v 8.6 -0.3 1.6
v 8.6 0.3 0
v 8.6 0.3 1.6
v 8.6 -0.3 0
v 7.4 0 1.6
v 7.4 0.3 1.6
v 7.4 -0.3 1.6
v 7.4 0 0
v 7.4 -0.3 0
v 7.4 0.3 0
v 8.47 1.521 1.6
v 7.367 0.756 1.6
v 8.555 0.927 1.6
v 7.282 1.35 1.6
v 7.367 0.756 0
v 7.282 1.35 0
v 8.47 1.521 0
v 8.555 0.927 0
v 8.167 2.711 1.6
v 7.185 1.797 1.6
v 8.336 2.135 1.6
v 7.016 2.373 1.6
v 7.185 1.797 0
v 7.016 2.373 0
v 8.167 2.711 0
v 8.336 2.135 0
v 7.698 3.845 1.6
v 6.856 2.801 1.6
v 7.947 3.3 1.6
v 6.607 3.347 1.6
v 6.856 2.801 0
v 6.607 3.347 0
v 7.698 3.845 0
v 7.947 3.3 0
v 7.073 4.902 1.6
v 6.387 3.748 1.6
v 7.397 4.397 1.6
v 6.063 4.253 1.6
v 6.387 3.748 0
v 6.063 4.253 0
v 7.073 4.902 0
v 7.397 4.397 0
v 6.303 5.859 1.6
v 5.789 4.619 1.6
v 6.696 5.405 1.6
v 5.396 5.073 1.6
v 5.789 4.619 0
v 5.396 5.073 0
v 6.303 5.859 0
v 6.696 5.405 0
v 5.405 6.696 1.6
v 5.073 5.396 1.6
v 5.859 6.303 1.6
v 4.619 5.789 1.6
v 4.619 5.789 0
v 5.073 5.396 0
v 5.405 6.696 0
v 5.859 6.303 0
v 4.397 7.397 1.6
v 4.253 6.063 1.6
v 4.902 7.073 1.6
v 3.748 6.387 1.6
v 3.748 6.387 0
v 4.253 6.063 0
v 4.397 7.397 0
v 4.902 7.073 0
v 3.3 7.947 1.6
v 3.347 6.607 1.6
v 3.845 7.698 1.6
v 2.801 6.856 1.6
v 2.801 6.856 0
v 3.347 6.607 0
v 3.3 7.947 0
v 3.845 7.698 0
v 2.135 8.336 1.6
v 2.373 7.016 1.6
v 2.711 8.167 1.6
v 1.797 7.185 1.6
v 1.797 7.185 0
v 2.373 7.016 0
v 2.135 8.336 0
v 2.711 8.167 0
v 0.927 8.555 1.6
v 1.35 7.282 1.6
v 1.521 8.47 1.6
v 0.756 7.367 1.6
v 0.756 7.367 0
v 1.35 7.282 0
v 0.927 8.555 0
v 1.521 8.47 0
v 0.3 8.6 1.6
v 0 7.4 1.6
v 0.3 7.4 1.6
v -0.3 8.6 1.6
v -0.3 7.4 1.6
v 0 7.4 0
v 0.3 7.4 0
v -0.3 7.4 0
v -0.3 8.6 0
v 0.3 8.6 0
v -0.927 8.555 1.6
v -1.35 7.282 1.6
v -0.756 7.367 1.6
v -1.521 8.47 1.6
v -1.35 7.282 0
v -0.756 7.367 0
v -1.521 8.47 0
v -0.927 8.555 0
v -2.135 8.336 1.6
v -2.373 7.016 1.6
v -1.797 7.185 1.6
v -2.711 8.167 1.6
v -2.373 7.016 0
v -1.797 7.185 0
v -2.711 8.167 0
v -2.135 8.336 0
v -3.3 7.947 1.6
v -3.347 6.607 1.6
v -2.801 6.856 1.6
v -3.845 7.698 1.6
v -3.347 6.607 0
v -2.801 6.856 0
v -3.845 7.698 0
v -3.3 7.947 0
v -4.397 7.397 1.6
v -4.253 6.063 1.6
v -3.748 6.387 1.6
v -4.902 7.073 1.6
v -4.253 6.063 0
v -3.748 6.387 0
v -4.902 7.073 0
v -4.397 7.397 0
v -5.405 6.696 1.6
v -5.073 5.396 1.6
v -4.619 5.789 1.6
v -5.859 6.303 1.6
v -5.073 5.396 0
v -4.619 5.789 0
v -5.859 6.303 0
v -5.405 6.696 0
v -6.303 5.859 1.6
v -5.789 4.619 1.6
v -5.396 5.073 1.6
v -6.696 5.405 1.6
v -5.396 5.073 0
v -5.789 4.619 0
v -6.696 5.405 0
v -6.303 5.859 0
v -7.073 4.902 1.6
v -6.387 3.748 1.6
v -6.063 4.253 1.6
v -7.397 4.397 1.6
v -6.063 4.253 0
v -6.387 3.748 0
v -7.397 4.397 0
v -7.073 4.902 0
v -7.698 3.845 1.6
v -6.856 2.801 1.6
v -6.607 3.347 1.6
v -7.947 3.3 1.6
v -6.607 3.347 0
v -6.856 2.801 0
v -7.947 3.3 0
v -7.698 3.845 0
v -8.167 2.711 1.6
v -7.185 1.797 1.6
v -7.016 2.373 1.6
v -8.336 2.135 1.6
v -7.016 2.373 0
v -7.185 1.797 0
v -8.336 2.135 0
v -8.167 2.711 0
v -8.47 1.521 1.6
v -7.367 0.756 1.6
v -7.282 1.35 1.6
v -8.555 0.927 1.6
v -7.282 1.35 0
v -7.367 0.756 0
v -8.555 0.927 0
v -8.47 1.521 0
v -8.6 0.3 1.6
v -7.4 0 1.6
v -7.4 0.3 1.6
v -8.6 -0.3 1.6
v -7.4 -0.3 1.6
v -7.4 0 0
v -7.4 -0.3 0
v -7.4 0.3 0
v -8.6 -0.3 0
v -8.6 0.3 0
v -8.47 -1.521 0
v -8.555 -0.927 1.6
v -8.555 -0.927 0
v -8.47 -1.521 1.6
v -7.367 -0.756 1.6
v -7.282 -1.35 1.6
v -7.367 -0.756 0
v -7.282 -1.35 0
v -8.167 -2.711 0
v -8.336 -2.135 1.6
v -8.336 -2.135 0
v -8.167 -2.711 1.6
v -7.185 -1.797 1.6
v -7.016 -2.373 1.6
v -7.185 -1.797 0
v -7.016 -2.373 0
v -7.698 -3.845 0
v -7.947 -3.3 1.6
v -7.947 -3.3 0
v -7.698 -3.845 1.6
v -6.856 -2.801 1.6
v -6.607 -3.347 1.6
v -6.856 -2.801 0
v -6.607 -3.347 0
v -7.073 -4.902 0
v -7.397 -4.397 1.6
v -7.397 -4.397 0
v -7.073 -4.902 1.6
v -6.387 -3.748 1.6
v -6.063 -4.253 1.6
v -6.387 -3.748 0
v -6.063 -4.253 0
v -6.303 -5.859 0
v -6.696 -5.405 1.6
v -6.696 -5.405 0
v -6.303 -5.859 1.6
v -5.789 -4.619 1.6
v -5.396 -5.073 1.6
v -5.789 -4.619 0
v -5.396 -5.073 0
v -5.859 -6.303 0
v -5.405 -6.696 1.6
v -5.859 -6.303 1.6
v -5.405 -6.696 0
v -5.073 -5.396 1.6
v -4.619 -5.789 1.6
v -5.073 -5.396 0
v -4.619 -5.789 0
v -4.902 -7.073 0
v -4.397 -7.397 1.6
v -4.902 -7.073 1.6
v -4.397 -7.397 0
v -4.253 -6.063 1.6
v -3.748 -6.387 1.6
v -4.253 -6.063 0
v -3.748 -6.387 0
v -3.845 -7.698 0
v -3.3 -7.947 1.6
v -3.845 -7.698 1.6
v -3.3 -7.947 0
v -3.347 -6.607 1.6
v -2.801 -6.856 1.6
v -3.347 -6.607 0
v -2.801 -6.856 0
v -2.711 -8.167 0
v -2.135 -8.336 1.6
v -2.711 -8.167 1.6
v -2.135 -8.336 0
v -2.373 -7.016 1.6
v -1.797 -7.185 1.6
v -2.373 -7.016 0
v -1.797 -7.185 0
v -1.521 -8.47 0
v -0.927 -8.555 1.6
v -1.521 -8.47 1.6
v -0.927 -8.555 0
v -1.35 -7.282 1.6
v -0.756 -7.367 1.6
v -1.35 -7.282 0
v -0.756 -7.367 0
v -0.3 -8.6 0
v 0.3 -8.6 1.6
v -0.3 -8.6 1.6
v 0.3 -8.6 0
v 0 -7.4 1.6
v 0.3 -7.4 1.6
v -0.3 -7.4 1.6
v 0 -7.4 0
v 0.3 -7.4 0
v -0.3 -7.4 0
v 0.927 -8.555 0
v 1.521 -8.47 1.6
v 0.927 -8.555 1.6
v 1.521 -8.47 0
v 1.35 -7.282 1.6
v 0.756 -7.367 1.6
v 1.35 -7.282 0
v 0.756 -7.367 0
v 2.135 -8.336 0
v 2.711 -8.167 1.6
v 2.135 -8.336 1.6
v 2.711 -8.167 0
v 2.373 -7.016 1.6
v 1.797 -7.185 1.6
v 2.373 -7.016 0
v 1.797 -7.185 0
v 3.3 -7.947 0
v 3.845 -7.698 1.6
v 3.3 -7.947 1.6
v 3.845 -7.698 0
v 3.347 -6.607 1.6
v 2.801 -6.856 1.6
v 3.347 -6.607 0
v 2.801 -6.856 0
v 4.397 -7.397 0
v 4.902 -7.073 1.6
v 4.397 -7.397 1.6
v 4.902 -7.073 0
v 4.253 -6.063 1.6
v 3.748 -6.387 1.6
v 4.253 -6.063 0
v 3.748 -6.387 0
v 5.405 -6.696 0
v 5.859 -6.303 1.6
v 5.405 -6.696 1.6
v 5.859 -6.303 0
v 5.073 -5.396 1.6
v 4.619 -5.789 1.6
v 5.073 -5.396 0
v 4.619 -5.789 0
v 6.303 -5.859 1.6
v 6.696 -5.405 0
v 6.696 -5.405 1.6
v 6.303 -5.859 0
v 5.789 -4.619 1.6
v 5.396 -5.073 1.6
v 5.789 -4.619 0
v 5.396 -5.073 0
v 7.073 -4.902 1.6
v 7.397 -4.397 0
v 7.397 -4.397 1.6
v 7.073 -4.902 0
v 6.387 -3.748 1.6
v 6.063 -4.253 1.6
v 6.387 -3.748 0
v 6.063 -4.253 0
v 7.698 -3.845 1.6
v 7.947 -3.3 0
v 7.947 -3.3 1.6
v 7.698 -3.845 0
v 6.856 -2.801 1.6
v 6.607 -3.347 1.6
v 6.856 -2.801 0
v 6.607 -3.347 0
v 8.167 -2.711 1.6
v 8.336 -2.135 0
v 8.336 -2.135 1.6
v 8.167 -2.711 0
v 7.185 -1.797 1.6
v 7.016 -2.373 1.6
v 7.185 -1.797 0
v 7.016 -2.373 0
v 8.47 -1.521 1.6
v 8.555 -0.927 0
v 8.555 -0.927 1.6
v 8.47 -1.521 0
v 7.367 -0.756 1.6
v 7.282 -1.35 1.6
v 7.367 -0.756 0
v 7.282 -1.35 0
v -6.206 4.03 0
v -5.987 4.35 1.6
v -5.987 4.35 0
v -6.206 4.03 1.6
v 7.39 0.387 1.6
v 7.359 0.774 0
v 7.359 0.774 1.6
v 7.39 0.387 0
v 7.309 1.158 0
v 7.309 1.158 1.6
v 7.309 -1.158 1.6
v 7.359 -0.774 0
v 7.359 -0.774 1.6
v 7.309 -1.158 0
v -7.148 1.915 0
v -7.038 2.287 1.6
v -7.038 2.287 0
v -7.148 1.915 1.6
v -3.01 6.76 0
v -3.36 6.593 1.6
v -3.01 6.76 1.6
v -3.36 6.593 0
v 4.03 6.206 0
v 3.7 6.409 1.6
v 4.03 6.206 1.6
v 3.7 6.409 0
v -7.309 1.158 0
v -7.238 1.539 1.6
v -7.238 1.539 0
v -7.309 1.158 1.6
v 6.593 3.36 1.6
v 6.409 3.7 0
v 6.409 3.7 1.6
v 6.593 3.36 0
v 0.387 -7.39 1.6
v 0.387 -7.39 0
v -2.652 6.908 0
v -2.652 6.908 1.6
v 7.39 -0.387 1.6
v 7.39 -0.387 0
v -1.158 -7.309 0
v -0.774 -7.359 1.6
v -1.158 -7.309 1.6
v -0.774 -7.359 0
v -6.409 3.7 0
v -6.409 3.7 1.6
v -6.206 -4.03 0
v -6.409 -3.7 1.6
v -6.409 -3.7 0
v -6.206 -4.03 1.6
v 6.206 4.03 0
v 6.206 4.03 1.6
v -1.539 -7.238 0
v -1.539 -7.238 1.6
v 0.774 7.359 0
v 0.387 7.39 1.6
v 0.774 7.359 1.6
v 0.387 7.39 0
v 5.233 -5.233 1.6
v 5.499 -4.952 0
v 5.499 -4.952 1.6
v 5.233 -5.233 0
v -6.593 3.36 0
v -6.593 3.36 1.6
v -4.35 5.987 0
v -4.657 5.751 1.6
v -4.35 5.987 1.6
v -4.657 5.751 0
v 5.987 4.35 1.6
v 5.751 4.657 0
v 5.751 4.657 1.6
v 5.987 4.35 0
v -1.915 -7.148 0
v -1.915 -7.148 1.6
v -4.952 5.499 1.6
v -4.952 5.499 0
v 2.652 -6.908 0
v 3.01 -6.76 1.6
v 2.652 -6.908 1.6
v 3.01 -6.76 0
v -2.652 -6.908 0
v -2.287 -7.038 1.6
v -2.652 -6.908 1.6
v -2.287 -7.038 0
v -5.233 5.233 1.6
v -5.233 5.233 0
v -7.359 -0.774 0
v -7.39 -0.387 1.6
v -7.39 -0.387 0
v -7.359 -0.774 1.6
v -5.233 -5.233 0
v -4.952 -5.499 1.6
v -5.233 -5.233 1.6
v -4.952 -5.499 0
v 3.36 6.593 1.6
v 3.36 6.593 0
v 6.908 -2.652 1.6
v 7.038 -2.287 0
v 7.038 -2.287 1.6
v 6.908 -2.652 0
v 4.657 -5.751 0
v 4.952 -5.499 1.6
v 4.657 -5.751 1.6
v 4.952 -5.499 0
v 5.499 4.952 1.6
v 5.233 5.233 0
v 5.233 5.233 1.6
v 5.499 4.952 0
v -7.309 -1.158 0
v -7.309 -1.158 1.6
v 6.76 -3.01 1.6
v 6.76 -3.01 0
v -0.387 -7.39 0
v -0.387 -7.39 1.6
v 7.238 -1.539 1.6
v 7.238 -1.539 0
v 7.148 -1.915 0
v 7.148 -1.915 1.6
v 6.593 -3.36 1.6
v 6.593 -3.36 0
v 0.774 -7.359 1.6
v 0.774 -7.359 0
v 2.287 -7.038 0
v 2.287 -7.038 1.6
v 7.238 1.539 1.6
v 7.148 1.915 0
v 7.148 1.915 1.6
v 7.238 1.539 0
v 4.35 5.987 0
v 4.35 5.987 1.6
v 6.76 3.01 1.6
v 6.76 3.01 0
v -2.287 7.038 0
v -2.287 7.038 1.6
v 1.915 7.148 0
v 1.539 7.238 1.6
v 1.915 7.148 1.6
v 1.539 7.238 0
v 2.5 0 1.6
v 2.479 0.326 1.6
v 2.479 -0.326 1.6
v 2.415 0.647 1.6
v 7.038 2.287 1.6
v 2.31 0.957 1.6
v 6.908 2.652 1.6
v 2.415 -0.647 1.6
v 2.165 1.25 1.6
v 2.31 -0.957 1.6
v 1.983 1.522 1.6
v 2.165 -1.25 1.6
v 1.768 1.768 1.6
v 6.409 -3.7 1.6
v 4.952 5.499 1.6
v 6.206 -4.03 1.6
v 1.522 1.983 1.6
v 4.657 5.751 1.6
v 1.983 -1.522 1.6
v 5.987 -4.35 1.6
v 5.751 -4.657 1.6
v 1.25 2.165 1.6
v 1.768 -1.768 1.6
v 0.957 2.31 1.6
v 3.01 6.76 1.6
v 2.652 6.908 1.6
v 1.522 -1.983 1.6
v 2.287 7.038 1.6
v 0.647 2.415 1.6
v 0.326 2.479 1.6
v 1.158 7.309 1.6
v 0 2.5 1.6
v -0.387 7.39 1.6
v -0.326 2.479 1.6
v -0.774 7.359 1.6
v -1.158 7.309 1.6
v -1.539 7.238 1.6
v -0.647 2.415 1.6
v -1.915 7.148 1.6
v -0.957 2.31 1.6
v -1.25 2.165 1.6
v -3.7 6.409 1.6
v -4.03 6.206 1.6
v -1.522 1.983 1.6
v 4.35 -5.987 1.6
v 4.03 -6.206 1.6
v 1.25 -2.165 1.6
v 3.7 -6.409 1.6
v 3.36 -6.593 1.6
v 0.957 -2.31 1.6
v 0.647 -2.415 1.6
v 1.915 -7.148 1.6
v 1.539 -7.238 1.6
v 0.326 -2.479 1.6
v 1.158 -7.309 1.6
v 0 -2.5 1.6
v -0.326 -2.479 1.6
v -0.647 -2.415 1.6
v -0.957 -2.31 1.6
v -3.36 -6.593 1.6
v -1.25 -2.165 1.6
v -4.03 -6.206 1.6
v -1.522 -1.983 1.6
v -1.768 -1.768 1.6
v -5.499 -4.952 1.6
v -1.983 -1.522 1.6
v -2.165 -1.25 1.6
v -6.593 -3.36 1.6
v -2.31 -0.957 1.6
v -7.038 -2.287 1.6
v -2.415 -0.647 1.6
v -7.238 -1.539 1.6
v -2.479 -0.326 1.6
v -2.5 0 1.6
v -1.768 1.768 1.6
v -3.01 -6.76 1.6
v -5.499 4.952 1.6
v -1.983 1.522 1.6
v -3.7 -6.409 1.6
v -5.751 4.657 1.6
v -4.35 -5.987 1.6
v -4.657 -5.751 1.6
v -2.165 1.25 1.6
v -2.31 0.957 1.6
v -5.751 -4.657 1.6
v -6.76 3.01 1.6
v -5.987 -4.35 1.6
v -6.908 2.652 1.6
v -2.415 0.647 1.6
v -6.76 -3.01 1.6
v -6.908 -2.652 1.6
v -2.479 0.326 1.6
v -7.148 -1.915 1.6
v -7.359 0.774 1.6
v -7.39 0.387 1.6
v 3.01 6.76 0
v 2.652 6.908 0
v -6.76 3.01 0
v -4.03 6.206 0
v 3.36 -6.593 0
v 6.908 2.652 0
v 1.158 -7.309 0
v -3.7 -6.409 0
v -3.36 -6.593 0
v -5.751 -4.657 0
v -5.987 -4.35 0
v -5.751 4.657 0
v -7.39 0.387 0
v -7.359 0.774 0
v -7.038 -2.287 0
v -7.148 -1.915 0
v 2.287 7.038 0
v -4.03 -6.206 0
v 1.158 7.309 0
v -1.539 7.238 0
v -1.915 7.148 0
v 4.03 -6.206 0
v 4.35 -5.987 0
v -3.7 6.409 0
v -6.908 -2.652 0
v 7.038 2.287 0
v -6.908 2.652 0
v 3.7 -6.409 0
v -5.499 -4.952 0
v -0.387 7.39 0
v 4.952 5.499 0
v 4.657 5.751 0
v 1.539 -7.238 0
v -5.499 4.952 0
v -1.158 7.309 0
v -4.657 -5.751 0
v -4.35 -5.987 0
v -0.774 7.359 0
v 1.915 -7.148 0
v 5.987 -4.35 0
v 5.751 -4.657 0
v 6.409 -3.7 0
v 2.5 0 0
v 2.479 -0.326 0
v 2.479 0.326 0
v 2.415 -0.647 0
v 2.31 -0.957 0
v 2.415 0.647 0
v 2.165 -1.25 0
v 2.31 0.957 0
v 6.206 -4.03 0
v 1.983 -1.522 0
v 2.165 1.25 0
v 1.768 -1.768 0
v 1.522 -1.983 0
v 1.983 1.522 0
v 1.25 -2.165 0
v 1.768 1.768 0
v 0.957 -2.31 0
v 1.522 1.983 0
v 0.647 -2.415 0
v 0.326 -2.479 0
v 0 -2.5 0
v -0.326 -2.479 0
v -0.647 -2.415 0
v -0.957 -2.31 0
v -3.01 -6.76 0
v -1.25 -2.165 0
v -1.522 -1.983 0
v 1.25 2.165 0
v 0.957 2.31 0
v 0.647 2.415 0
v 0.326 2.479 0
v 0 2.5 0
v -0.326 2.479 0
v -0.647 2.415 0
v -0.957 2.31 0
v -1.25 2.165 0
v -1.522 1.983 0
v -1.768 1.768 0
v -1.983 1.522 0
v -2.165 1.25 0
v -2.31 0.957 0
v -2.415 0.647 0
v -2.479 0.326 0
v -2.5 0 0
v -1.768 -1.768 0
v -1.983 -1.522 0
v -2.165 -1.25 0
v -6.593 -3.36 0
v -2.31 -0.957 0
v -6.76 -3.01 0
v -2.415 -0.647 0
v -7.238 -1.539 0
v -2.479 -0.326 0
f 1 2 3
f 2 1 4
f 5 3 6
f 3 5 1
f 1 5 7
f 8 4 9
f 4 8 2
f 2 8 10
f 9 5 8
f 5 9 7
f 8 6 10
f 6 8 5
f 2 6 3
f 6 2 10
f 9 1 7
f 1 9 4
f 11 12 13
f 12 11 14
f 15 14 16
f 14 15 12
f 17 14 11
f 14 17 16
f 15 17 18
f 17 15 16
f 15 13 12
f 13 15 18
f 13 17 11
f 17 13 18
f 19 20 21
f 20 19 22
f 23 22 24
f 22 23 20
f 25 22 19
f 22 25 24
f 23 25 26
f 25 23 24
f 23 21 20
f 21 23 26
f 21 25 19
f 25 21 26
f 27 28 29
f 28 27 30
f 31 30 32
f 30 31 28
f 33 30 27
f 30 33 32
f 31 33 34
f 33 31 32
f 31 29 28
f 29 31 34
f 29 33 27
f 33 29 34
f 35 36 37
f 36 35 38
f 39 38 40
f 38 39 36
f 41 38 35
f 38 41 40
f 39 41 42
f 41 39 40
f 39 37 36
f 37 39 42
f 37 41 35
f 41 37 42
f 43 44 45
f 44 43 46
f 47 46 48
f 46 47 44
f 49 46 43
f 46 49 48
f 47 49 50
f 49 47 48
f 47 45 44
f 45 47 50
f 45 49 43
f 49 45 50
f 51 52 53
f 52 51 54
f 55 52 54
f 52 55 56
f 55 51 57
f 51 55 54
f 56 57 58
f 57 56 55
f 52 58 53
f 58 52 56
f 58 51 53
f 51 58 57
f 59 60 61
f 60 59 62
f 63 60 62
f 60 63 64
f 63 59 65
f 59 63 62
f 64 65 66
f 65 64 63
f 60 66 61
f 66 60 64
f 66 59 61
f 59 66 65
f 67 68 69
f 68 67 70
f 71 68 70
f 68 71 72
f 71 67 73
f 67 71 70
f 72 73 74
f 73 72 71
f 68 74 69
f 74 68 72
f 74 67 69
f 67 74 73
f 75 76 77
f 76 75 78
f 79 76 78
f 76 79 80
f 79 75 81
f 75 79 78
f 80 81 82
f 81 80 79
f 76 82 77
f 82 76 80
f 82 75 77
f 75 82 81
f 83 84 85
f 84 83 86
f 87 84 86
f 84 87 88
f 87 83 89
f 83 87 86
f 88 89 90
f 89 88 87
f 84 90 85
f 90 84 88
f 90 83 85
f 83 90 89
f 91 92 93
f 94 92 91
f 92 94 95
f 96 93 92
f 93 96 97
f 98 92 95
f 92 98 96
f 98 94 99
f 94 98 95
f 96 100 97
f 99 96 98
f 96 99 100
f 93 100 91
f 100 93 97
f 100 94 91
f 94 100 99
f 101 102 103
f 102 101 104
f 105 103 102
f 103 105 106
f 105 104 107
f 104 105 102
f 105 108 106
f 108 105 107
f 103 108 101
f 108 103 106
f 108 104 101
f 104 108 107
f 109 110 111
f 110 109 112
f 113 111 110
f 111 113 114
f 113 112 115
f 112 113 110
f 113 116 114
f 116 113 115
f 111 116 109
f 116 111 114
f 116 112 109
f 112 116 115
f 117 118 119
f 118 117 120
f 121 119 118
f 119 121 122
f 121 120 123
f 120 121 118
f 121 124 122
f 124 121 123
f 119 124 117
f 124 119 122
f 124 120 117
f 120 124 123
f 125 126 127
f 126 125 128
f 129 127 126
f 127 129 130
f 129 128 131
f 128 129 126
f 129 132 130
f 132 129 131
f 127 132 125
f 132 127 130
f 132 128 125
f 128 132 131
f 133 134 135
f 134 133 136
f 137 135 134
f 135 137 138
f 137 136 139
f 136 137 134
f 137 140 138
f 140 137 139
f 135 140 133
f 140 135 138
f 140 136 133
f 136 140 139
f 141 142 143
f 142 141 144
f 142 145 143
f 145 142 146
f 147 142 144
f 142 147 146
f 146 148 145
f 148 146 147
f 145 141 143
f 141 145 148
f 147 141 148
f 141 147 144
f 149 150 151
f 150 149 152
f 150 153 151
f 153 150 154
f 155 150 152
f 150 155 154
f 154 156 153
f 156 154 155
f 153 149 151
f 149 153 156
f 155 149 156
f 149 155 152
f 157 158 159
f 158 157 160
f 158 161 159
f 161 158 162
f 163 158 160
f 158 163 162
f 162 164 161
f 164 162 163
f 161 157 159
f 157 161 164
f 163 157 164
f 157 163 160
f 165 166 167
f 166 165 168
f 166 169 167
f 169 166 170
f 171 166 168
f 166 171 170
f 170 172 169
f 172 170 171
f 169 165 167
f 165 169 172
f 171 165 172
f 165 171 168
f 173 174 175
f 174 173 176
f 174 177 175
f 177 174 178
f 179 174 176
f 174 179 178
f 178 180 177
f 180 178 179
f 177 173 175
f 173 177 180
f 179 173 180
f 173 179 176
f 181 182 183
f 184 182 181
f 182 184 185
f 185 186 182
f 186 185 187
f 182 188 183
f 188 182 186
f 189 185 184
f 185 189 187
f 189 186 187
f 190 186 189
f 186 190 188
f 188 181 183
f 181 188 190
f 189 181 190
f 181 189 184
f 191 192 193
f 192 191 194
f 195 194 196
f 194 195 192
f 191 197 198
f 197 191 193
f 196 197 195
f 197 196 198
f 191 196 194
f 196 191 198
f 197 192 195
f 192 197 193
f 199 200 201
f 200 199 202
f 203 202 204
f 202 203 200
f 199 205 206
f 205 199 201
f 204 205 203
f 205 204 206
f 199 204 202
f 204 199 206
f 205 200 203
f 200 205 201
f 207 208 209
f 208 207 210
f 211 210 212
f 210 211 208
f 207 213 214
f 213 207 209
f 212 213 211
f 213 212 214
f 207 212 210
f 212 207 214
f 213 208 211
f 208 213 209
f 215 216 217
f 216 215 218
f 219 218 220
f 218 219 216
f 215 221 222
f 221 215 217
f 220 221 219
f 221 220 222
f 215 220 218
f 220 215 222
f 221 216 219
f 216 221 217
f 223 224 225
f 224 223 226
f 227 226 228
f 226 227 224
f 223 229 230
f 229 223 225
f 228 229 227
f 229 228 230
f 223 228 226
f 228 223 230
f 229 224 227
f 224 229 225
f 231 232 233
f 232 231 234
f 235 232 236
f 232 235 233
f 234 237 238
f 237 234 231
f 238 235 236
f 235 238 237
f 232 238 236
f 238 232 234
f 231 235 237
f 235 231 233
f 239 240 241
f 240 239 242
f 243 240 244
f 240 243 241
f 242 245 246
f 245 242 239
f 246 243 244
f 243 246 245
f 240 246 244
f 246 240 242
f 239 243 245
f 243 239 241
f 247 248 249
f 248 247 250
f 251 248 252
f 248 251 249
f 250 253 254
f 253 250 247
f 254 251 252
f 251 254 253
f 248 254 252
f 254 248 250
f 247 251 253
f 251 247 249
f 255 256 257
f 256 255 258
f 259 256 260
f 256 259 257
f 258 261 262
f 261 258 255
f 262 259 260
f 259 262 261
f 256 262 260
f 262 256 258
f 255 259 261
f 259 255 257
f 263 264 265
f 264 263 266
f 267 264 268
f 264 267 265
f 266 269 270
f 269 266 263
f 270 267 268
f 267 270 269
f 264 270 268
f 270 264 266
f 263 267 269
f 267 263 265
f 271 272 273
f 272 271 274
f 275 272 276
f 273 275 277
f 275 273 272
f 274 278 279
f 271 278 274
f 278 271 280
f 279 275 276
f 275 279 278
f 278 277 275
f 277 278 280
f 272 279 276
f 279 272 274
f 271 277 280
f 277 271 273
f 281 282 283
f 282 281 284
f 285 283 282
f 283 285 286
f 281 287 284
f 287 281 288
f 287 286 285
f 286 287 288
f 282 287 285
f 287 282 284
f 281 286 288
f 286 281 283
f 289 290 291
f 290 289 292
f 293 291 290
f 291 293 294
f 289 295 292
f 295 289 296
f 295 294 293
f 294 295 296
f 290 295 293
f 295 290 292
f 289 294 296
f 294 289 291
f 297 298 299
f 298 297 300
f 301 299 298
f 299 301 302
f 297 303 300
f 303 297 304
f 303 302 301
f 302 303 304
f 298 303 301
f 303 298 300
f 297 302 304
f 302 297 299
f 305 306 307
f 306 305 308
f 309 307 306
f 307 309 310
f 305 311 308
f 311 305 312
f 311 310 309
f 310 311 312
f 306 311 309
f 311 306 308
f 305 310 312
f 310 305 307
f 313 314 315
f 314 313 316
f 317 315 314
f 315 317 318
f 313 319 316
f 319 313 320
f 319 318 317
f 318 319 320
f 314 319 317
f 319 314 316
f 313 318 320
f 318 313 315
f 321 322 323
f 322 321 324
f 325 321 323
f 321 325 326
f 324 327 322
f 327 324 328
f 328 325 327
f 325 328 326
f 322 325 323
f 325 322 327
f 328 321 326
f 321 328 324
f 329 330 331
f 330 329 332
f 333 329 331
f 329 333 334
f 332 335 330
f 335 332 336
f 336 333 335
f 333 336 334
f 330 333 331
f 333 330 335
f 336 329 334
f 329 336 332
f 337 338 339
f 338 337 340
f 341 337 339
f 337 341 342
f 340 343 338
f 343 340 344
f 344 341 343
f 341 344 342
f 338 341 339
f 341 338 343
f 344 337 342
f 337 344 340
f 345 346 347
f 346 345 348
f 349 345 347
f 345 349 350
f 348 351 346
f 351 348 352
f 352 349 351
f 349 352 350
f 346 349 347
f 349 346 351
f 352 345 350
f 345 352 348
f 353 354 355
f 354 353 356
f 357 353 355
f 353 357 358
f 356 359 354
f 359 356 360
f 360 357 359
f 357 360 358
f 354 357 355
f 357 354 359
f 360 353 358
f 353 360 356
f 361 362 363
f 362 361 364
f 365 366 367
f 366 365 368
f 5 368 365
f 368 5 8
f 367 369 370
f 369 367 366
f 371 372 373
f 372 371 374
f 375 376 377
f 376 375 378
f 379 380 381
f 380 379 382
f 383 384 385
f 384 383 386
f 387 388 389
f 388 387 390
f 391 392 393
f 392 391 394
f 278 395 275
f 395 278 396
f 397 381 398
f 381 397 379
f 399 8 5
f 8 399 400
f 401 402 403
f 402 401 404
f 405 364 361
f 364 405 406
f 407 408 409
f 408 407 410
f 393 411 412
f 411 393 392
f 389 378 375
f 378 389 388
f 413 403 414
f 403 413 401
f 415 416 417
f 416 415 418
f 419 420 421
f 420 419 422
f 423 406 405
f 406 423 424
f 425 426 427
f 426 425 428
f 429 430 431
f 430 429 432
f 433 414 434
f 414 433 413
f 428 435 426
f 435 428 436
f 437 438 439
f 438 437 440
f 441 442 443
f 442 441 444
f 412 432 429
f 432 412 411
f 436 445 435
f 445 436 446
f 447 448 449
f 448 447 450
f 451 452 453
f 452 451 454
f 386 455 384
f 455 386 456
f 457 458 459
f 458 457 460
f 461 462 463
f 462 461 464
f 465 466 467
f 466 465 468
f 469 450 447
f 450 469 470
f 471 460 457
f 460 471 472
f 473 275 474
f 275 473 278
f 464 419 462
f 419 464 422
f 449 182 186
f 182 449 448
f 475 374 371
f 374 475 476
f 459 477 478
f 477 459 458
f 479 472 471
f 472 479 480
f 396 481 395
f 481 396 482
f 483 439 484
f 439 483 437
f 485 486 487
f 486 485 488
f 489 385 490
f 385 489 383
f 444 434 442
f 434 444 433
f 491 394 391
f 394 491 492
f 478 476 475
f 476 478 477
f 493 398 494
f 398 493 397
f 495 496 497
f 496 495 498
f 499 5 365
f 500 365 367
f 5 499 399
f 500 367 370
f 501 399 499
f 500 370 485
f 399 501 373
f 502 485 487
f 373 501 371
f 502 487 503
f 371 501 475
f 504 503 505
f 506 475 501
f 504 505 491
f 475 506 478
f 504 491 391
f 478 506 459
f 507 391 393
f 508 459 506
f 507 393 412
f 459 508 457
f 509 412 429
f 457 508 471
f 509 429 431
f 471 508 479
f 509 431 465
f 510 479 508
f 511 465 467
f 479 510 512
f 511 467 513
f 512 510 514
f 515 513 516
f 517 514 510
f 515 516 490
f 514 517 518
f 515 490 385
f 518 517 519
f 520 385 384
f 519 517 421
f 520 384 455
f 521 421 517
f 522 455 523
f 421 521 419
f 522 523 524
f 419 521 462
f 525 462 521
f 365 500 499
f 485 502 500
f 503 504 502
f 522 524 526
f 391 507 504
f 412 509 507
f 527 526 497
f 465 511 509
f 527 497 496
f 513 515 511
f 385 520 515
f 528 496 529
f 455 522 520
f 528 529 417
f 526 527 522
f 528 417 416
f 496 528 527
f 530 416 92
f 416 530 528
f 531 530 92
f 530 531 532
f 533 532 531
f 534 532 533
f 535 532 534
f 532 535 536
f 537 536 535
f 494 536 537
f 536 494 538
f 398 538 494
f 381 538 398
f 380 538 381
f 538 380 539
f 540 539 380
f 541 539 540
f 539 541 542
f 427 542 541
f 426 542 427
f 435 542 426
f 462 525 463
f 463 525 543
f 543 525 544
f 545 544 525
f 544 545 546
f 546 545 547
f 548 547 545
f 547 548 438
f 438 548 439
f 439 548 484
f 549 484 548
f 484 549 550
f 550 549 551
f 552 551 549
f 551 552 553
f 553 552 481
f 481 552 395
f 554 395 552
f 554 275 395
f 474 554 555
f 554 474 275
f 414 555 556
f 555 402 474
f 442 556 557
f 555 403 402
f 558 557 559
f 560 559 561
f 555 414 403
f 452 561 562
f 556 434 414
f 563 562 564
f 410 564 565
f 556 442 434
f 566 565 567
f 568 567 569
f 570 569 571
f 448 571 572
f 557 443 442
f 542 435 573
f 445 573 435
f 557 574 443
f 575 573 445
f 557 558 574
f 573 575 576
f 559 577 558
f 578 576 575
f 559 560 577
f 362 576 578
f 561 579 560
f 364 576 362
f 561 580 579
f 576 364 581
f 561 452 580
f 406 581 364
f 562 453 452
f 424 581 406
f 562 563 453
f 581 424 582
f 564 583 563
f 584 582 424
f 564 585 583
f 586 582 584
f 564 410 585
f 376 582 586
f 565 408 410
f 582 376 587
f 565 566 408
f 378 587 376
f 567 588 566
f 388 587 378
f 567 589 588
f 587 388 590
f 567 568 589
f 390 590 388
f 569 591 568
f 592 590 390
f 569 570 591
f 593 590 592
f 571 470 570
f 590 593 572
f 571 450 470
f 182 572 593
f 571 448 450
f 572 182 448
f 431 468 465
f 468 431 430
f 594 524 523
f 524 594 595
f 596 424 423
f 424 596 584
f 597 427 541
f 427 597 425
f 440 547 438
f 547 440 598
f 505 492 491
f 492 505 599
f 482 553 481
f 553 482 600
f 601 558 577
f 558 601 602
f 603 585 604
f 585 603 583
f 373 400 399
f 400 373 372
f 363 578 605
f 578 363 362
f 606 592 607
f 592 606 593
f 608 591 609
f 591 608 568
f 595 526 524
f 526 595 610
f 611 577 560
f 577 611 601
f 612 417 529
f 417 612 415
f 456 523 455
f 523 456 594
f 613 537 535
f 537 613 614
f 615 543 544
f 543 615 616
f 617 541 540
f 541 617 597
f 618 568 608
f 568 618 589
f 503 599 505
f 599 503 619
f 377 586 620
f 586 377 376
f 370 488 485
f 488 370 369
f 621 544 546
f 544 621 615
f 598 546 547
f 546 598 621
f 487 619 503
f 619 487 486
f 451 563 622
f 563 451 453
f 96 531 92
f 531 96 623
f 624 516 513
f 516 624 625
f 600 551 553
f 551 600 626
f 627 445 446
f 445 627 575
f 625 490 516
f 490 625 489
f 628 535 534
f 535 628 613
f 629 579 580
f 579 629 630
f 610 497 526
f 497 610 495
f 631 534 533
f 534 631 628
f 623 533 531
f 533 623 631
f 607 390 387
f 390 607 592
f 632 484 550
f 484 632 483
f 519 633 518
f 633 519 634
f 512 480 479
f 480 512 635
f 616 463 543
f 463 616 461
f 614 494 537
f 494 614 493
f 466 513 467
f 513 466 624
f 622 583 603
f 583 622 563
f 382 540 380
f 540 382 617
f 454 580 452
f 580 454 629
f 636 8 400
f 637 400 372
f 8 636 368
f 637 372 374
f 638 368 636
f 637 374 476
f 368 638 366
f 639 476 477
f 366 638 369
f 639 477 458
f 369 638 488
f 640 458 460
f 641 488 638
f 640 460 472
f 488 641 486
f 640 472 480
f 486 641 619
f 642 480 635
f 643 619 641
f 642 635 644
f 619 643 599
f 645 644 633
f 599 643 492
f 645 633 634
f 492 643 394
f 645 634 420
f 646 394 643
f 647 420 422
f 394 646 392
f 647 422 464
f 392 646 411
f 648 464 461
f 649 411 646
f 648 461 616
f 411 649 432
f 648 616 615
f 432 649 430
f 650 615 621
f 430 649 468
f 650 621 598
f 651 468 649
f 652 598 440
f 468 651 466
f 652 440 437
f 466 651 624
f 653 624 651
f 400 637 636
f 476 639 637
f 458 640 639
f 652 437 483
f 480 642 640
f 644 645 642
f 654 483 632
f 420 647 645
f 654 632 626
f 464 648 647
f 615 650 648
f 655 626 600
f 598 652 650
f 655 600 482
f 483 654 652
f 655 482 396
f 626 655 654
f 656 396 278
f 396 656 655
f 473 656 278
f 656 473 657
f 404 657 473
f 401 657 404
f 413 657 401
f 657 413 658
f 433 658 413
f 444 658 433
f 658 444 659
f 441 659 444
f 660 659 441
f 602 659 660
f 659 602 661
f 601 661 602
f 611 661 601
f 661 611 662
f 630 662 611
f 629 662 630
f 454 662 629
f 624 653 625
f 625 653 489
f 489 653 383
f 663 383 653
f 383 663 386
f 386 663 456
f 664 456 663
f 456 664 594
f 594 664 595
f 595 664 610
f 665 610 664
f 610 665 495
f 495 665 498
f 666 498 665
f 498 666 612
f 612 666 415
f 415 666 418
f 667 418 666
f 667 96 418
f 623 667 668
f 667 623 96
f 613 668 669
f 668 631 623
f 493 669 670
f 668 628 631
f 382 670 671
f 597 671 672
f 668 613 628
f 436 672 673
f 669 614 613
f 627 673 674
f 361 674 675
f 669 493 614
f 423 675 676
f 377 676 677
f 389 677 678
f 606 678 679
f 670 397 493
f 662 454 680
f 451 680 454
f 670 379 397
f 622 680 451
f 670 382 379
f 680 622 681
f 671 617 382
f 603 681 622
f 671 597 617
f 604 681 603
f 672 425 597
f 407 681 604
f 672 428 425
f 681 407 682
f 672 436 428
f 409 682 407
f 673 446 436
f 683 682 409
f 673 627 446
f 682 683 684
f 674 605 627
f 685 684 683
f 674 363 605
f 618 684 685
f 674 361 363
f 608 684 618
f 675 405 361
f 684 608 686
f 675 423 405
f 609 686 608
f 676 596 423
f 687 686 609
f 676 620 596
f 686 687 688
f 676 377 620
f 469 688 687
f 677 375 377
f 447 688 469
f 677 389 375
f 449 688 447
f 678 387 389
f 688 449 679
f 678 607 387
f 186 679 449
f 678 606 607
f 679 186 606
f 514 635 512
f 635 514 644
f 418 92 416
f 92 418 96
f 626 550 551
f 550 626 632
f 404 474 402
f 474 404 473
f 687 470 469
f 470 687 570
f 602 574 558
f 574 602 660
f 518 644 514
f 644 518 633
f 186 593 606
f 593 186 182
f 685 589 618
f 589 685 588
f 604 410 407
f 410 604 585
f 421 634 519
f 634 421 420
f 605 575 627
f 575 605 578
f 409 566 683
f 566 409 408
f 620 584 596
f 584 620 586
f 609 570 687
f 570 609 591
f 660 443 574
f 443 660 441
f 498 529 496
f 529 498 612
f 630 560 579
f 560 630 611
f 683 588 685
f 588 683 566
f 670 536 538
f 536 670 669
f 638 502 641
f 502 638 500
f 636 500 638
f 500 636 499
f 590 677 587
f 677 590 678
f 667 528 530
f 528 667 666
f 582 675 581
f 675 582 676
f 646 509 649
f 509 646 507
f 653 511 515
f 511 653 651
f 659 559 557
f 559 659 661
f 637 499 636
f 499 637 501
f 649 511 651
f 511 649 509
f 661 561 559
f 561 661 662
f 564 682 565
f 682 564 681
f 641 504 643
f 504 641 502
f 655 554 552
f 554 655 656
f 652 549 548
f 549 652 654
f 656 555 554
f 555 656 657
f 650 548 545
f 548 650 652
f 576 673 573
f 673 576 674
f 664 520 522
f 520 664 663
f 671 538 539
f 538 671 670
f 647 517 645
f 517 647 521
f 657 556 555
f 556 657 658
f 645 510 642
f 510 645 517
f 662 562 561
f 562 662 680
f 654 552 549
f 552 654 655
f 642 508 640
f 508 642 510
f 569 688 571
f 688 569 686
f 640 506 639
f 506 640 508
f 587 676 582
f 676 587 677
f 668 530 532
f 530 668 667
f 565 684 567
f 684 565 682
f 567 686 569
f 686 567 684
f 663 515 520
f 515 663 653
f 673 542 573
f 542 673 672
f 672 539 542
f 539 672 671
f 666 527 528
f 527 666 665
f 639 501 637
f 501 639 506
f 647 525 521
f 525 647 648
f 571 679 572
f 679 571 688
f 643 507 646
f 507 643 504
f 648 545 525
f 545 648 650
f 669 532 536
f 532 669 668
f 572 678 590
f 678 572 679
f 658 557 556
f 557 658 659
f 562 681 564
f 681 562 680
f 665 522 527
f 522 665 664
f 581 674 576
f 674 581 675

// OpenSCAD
// part_id: mar1
// name: Mars companion gear (provisional)
// source_drawing_ids: DRW-012
// units: mm
// revision: 0.1-provisional
// SPDX-License-Identifier: MIT

module mar1_tooth_ring(root_d = 14.8, tip_d = 17.2, tooth_count = 44, thickness = 1.6, tooth_w = 0.60) {
    union() {
        cylinder(d = root_d, h = thickness, center = false, $fn = 120);
        for (a = [0 : 360 / tooth_count : 360 - 360 / tooth_count]) {
            rotate([0, 0, a])
                translate([root_d / 2, -tooth_w / 2, 0])
                    cube([(tip_d - root_d) / 2, tooth_w, thickness], center = false);
        }
    }
}

module part_mar1(
    root_d = 14.8,
    tip_d = 17.2,
    tooth_count = 44,
    thickness = 1.6,
    bore_d = 5.0
) {
    difference() {
        mar1_tooth_ring(root_d = root_d, tip_d = tip_d, tooth_count = tooth_count, thickness = thickness);
        translate([0, 0, -0.05]) cylinder(d = bore_d, h = thickness + 0.1, $fn = 48);
    }
}

// ---- "main guard" ----
// Default to previewing when opened directly:
if (is_undef(__LIB_MODE__)) {
    part_mar1();
}
